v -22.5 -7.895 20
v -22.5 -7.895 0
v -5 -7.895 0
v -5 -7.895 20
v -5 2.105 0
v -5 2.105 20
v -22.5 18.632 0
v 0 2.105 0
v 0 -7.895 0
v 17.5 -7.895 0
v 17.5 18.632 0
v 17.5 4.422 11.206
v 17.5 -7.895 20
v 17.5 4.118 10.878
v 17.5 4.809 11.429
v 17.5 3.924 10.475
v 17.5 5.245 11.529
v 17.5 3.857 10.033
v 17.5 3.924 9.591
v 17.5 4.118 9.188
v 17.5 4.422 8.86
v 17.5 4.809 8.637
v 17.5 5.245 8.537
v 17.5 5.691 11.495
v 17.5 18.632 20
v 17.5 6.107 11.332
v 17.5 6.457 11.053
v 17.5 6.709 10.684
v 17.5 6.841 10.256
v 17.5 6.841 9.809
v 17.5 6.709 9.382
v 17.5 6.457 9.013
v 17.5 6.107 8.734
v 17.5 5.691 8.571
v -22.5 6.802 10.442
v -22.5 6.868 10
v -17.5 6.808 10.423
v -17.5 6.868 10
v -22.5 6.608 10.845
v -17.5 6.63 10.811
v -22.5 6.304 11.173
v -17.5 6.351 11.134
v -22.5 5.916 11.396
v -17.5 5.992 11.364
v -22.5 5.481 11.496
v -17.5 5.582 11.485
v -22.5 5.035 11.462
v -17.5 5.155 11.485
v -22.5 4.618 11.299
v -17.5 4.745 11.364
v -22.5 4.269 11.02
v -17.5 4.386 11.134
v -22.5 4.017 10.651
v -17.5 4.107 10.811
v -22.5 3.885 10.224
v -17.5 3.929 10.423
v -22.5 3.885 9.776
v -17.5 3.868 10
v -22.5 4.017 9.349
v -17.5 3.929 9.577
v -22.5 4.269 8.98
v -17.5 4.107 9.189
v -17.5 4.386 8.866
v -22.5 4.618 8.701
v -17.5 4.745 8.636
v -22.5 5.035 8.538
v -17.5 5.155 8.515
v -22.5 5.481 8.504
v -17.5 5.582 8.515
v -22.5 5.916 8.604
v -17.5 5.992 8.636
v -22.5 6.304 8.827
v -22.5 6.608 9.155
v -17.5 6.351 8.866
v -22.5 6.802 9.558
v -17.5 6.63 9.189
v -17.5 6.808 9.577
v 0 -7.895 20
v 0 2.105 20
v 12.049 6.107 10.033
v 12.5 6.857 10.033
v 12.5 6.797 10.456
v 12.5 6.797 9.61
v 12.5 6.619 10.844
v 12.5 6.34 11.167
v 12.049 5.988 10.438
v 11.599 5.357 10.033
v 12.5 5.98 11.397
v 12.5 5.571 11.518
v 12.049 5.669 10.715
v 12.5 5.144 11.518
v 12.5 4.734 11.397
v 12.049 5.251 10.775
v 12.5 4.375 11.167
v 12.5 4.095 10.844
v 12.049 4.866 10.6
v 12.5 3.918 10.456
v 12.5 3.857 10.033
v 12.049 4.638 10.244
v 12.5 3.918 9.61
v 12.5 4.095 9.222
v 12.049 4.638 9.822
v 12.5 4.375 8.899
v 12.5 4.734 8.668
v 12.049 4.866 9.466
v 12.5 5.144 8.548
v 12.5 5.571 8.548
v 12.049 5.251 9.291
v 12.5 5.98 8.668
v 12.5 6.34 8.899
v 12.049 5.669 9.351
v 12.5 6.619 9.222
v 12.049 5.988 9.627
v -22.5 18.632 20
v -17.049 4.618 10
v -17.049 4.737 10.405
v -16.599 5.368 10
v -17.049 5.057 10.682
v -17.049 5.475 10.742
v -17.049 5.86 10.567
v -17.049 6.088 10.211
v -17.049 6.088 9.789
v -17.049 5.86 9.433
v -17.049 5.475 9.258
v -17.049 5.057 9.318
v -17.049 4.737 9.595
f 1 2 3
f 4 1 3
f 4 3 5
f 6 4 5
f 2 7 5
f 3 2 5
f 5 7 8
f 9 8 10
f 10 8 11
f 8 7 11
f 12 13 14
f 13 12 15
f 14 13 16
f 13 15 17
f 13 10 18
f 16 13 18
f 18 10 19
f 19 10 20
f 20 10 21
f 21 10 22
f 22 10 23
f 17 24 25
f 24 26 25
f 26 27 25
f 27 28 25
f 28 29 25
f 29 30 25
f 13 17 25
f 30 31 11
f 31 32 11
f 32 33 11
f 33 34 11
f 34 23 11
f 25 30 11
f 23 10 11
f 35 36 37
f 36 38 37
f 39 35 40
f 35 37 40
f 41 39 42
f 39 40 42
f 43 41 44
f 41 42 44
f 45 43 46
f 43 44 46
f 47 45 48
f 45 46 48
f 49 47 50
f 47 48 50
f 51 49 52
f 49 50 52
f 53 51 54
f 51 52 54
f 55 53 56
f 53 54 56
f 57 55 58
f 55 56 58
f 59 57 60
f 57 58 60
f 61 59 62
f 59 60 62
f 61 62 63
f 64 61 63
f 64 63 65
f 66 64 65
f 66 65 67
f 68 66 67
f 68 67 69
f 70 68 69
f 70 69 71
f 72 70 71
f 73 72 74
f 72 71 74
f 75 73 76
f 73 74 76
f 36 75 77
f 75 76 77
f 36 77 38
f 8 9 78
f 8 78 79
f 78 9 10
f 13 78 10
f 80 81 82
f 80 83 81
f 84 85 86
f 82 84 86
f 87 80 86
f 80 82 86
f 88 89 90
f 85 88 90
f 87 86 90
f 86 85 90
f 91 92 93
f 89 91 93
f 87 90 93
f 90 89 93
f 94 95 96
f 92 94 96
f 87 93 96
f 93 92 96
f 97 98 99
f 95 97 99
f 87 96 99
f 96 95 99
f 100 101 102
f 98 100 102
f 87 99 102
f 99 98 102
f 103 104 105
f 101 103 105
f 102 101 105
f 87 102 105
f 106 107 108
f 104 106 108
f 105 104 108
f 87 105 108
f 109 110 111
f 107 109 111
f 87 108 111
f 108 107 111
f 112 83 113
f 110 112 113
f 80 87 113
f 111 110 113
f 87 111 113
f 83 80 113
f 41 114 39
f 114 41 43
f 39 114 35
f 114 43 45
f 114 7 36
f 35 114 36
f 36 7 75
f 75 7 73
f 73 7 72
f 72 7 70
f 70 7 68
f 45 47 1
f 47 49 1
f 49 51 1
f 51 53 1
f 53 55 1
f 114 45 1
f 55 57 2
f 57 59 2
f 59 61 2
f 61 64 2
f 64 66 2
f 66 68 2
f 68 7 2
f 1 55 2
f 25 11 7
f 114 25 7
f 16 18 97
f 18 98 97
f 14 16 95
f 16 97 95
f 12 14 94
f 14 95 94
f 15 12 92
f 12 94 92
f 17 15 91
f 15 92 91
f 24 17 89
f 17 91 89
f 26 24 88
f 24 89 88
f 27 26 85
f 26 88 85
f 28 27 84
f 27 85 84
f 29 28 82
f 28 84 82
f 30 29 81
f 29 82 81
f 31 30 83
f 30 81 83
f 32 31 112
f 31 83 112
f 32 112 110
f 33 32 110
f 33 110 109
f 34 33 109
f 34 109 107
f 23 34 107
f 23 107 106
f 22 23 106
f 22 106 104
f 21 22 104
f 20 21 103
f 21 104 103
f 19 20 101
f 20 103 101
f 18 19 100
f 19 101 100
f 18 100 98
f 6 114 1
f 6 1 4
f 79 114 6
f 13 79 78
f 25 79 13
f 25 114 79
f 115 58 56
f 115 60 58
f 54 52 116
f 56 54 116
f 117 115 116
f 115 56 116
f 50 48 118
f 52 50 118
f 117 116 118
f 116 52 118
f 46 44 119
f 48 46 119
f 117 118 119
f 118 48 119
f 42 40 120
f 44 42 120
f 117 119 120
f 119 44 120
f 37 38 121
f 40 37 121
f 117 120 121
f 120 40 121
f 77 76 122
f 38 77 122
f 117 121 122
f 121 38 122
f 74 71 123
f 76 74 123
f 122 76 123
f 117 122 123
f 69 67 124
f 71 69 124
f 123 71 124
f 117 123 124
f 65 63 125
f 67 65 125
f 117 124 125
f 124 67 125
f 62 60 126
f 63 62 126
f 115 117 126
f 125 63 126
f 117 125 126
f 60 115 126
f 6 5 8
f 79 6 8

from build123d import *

# Parameters (mm, degrees)
F0_W     = 5
F0_H     = 9.9937266076
F1_DEPTH = 20
F2_DEPTH = 158.6
F5_D     = 3
F5_DEPTH = 5
F5_TIP   = 0.9012909285
F6_D     = 3
F6_DEPTH = 5
F6_TIP   = 0.9012909285


with BuildPart() as f1:
    # F0 (on Top) → F1 (new body)
    with BuildSketch(Plane.XY):
        Polygon((17.5, 18.631580086), (-22.5, 18.631580086), (-22.5, -7.8947371674), (-5, -7.8947371674), (-5, 2.0989894401), (-5, 2.1052628326), (0, 2.1052628326), (0, 2.0989894401), (0, -7.8947371674), (17.5, -7.8947371674), align=None)
        with Locations((-2.5, -2.8978738637)):
            Rectangle(F0_W, F0_H)
    extrude(amount=F1_DEPTH)

    # F0 (on Top) → F2 (cut)
    with BuildSketch(Plane.XY):
        with Locations((-2.5, -2.8978738637)):
            Rectangle(F0_W, F0_H)
    extrude(amount=F2_DEPTH, mode=Mode.SUBTRACT)

    # F5
    with Locations(Plane(origin=(-22.5, 0, 0), x_dir=(0, -1, 0), z_dir=(-1, 0, 0))):
        with Locations((-5.3684214593, 10)):
            Hole(F5_D / 2, depth=F5_DEPTH)
            with Locations((0, 0, -(F5_DEPTH + F5_TIP / 2))):  # 118° drill point
                Cone(0, F5_D / 2, F5_TIP, mode=Mode.SUBTRACT)

    # F6
    with Locations(Plane.YZ.offset(17.5)):
        with Locations((5.357359536, 10.0329257548)):
            Hole(F6_D / 2, depth=F6_DEPTH)
            with Locations((0, 0, -(F6_DEPTH + F6_TIP / 2))):  # 118° drill point
                Cone(0, F6_D / 2, F6_TIP, mode=Mode.SUBTRACT)


solid = f1.part
